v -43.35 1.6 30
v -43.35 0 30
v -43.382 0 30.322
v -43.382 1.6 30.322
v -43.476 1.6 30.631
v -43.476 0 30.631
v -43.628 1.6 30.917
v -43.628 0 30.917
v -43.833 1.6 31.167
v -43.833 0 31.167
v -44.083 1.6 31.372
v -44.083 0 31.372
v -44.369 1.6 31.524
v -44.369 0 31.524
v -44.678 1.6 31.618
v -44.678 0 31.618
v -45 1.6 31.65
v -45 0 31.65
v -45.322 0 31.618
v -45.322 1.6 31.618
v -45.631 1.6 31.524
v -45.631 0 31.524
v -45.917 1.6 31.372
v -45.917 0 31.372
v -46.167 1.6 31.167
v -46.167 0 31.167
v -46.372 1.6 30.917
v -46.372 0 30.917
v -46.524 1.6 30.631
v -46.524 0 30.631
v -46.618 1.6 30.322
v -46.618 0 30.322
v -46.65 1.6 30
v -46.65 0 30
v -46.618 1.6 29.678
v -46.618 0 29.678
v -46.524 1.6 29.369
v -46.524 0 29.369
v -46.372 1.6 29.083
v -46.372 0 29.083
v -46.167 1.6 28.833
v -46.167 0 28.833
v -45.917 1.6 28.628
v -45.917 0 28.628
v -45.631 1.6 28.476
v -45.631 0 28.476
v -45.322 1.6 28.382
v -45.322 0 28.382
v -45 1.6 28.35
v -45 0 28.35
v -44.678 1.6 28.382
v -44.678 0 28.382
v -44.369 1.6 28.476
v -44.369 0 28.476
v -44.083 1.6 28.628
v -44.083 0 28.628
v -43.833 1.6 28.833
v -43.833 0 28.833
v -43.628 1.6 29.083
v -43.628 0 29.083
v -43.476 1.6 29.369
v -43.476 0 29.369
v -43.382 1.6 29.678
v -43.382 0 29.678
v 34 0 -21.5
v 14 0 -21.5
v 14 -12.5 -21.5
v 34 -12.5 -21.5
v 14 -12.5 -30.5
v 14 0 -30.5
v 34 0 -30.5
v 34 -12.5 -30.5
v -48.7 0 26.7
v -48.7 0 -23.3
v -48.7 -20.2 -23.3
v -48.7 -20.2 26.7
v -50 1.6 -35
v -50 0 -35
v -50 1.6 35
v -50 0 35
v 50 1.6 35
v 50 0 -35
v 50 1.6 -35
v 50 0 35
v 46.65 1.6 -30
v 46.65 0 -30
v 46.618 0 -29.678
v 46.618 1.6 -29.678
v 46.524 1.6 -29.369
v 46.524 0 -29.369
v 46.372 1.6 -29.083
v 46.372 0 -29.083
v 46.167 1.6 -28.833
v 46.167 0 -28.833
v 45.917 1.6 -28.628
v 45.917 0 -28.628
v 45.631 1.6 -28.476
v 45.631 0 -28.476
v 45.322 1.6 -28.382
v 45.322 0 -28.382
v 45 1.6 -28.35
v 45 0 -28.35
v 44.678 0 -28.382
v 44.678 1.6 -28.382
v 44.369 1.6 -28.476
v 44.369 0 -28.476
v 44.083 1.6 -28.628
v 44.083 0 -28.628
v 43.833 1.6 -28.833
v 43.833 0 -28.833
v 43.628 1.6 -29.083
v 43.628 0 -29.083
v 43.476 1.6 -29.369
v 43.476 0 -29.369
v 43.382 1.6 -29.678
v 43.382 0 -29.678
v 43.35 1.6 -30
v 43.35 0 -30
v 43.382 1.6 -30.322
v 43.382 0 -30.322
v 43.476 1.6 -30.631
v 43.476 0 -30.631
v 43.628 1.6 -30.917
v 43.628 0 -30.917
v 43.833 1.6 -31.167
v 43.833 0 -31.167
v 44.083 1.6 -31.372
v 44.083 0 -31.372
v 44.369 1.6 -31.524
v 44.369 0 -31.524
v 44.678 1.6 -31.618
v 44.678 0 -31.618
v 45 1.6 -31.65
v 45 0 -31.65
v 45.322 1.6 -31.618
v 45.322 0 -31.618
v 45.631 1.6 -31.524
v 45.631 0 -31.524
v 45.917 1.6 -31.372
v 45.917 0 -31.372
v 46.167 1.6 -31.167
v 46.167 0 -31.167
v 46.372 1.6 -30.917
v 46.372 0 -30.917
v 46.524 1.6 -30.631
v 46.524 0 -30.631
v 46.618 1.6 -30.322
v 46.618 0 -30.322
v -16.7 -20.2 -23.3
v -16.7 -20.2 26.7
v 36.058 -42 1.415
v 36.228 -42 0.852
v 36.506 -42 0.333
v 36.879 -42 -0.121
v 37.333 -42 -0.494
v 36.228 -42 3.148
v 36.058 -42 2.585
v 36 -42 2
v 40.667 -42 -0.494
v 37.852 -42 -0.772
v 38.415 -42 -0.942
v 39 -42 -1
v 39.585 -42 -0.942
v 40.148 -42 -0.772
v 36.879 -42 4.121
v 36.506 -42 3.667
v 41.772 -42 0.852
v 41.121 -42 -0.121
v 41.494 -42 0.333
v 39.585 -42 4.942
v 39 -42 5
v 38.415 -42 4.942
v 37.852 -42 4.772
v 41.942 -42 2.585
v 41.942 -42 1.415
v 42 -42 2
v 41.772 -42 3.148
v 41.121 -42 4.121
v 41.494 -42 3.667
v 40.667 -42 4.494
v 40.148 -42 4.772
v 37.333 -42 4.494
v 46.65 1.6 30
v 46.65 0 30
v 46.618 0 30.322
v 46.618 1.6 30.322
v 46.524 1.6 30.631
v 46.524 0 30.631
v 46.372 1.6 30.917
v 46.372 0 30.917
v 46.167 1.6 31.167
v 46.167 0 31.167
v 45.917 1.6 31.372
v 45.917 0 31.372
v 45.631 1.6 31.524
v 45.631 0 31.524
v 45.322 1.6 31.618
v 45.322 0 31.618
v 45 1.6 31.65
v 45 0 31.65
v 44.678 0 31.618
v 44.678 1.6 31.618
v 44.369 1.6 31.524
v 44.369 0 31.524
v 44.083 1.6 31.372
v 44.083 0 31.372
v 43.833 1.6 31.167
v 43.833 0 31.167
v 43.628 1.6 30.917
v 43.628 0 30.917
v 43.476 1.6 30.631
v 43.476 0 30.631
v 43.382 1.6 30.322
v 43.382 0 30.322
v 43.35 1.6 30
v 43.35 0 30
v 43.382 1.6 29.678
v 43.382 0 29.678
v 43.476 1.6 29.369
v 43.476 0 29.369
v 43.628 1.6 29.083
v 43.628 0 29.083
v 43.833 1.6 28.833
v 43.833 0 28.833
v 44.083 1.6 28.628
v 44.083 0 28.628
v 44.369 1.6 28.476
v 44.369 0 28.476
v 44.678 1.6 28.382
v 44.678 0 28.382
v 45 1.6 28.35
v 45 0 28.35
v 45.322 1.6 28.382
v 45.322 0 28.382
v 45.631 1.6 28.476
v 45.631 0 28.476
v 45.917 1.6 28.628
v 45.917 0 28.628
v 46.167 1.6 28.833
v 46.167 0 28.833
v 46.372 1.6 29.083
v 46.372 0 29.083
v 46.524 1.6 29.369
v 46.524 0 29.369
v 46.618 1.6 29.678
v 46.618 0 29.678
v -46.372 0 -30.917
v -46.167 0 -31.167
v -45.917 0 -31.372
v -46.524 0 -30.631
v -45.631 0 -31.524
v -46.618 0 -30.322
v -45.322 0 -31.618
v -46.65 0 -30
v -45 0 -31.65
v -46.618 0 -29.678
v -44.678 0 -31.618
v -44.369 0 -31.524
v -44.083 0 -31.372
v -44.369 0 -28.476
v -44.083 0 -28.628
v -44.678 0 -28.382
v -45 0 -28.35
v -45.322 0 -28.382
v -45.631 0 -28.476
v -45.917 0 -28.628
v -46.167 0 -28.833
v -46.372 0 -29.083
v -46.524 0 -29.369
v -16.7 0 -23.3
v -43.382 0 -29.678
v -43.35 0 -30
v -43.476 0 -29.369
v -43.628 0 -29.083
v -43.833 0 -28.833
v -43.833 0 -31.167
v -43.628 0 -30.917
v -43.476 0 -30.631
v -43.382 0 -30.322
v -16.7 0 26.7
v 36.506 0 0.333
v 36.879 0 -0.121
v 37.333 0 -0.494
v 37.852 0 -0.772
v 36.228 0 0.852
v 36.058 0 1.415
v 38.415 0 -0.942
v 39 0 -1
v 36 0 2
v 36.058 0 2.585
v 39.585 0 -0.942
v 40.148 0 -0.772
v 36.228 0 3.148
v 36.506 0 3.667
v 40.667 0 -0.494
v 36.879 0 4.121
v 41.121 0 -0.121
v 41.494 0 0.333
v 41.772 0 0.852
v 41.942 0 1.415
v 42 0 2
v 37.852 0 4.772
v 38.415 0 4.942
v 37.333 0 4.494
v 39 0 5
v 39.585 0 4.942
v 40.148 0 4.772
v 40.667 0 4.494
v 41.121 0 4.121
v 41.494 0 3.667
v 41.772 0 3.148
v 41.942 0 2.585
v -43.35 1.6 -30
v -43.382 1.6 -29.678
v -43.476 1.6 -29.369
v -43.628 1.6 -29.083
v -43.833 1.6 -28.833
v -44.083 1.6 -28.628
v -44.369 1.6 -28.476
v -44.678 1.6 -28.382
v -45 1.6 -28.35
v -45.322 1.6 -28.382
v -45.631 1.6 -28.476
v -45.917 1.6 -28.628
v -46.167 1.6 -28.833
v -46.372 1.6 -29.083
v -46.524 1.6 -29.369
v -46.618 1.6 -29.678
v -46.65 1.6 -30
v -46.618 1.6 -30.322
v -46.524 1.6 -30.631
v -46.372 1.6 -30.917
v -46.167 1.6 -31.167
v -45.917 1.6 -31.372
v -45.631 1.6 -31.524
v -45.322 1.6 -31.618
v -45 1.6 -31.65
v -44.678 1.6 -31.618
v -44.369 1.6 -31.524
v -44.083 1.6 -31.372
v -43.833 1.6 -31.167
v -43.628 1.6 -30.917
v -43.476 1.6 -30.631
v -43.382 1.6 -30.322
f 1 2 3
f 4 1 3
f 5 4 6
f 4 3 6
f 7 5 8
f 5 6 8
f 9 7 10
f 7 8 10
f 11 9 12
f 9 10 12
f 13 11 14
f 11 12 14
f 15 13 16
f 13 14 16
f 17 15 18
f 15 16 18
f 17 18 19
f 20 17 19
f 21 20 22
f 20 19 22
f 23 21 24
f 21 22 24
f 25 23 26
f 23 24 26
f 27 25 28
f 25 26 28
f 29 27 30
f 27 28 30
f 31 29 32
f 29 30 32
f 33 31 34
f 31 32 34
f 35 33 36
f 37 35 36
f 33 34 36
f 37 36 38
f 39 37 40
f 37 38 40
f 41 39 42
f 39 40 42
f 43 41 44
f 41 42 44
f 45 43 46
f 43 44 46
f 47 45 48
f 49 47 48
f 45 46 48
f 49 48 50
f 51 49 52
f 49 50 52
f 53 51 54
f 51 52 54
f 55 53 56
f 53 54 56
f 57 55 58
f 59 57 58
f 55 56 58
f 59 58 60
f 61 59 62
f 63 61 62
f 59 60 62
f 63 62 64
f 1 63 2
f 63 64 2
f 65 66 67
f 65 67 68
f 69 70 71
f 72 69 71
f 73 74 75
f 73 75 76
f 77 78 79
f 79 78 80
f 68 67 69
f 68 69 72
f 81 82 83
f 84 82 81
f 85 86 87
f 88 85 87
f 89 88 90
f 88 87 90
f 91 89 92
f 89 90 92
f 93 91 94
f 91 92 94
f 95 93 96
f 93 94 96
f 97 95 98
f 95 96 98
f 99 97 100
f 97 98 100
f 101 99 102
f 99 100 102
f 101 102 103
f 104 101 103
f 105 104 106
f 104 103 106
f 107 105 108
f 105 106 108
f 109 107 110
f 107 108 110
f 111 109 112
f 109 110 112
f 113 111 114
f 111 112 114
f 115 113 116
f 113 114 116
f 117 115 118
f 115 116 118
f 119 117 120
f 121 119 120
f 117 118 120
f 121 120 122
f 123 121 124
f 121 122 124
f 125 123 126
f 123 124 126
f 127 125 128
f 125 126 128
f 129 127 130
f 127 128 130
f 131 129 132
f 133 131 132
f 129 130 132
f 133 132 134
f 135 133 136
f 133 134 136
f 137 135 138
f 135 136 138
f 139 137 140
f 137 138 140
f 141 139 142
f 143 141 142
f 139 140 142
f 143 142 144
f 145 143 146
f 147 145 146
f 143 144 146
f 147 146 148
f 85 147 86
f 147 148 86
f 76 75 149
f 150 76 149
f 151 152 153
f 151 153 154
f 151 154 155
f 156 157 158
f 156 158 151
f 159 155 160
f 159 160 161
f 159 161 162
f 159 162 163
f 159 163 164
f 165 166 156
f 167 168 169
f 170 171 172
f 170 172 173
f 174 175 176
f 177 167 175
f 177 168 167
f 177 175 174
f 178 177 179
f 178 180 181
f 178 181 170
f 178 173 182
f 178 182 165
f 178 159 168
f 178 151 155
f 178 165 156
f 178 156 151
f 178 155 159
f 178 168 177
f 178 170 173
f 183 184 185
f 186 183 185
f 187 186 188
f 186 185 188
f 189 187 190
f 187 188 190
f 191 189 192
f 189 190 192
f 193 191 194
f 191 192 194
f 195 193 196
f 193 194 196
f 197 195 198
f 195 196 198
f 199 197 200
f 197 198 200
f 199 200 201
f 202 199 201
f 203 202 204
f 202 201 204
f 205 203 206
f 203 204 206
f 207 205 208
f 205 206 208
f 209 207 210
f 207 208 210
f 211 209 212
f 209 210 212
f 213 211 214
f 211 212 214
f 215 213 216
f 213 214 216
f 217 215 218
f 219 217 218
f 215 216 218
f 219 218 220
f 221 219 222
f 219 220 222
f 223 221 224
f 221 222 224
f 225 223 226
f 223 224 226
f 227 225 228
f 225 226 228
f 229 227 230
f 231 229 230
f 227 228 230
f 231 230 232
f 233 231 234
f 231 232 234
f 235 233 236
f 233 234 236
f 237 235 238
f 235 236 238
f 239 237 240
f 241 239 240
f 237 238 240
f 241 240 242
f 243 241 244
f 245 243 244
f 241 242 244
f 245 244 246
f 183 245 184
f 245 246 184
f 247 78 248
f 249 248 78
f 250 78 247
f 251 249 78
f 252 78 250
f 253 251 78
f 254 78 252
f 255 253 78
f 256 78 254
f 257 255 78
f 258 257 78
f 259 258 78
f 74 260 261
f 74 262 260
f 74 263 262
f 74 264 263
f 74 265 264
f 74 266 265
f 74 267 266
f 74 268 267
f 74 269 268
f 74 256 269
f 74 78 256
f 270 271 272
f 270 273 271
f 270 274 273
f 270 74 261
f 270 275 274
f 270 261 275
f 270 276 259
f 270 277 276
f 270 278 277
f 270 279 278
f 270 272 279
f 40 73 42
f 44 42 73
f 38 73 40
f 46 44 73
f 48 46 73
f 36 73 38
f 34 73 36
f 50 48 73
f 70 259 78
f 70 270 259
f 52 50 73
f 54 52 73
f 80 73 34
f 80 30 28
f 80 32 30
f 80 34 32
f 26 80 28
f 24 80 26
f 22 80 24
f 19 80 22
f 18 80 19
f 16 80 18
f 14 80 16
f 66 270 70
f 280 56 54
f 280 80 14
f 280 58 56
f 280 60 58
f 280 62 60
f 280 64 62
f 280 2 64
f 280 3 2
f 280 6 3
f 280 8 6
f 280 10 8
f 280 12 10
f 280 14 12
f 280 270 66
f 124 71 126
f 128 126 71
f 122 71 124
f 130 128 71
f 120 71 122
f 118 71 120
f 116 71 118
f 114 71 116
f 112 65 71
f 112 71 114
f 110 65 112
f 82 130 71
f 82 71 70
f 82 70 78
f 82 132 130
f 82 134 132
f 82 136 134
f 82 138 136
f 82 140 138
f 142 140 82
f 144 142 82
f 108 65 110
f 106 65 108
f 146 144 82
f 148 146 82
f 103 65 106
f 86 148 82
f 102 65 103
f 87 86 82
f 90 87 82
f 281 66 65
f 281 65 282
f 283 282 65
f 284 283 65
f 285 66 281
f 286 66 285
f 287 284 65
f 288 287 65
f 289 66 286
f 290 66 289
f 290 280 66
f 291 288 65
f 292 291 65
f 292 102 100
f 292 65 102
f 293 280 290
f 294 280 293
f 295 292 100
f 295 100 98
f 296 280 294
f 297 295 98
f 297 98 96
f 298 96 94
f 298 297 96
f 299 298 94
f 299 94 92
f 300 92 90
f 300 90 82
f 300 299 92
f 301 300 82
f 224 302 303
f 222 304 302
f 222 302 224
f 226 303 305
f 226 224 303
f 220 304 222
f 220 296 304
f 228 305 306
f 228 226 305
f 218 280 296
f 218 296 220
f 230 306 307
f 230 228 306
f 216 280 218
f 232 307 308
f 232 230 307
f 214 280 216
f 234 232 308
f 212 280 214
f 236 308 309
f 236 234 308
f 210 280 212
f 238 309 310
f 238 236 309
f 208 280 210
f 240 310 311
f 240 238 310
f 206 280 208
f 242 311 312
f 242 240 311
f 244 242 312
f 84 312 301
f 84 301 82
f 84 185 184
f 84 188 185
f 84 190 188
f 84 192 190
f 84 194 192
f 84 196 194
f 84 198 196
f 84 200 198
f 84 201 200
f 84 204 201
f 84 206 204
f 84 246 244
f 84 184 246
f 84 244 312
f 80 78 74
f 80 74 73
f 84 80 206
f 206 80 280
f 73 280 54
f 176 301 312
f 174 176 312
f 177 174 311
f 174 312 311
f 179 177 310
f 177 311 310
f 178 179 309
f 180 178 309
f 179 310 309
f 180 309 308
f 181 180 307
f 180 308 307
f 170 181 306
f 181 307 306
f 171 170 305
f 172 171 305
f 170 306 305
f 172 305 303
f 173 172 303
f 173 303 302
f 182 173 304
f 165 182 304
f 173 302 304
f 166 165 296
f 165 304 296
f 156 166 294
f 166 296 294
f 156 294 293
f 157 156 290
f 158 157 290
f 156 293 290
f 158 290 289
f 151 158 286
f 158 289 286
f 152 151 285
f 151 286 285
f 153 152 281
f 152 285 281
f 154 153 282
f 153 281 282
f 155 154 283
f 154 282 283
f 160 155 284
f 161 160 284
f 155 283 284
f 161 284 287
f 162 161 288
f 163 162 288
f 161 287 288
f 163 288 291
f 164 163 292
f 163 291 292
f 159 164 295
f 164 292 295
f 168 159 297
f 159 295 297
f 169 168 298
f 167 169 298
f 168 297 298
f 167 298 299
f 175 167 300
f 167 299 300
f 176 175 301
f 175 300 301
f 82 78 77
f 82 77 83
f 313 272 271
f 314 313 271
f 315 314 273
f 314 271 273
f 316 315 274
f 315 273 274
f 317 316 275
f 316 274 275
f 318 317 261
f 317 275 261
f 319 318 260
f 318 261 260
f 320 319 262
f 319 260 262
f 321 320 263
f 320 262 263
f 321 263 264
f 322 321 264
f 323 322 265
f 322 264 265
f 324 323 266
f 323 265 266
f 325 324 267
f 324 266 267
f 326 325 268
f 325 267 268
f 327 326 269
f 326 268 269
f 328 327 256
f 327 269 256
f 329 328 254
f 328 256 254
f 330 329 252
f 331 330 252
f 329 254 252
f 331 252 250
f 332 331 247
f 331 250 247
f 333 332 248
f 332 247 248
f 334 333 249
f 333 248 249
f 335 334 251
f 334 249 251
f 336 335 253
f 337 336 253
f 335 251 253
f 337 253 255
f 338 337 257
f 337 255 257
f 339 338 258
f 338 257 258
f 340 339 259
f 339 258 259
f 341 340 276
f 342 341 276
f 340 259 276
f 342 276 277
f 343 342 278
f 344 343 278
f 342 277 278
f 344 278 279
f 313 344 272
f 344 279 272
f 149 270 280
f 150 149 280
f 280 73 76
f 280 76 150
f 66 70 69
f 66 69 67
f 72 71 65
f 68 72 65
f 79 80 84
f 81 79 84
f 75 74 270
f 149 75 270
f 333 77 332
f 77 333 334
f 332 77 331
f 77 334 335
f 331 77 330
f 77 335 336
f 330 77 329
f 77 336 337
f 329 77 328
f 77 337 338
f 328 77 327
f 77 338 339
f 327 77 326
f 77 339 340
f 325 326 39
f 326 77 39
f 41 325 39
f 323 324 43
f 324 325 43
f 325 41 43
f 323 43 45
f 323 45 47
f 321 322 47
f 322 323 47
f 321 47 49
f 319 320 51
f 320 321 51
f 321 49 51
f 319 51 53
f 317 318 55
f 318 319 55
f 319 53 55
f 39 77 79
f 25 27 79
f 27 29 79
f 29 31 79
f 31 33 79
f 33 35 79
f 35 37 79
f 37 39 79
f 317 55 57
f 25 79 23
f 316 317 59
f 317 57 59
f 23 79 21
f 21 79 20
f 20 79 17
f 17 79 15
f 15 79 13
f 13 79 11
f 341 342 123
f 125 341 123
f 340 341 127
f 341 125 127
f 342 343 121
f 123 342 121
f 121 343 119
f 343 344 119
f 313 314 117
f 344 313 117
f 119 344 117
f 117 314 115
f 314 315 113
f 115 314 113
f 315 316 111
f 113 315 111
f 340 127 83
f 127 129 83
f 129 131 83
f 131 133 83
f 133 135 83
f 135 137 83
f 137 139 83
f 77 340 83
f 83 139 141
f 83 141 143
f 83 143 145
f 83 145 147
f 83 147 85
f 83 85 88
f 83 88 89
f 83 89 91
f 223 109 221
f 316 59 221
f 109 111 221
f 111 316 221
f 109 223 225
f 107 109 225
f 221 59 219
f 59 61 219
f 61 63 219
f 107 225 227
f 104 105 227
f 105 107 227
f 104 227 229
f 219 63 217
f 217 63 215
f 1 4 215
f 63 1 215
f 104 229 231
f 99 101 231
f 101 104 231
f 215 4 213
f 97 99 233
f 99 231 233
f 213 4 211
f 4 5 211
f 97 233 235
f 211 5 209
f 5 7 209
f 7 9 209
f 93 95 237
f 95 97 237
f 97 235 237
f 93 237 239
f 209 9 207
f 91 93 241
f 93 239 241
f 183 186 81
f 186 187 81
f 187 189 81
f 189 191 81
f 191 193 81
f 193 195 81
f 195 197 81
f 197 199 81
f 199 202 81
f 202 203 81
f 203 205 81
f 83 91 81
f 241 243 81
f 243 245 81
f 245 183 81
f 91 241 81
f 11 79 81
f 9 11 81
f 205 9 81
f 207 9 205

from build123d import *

# Parameters (mm, degrees)
F0_W     = 100
F0_H     = 70
F0_R     = 1.65
F0_W_2   = 20
F0_H_2   = 9
F0_W_3   = 32
F0_H_3   = 50
F0_R_2   = 3
F1_DEPTH = 1.6
F2_DEPTH = 20.2
F3_DEPTH = 12.5
F4_DEPTH = 42


with BuildPart() as f1:
    # F0 (on Front) → F1 (new body)
    with BuildSketch(Plane.XZ):
        Rectangle(F0_W, F0_H)
        with Locations((-45, -30)):
            Circle(F0_R, mode=Mode.SUBTRACT)
        with Locations((24, -26)):
            Rectangle(F0_W_2, F0_H_2, mode=Mode.SUBTRACT)
        with Locations((45, -30)):
            Circle(F0_R, mode=Mode.SUBTRACT)
        with Locations((-32.7, 1.7)):
            Rectangle(F0_W_3, F0_H_3, mode=Mode.SUBTRACT)
        with Locations((-45, 30)):
            Circle(F0_R, mode=Mode.SUBTRACT)
        with Locations((39, 2)):
            Circle(F0_R_2, mode=Mode.SUBTRACT)
        with Locations((45, 30)):
            Circle(F0_R, mode=Mode.SUBTRACT)
        with Locations((-32.7, 1.7)):
            Rectangle(F0_W_3, F0_H_3)
        with Locations((24, -26)):
            Rectangle(F0_W_2, F0_H_2)
        with Locations((39, 2)):
            Circle(F0_R_2)
    extrude(amount=-F1_DEPTH)

    # F0 (on Front) → F2 (join)
    with BuildSketch(Plane.XZ):
        with Locations((-32.7, 1.7)):
            Rectangle(F0_W_3, F0_H_3)
    extrude(amount=F2_DEPTH)

    # F0 (on Front) → F3 (join)
    with BuildSketch(Plane.XZ):
        with Locations((24, -26)):
            Rectangle(F0_W_2, F0_H_2)
    extrude(amount=F3_DEPTH)

    # F0 (on Front) → F4 (join)
    with BuildSketch(Plane.XZ):
        with Locations((39, 2)):
            Circle(F0_R_2)
    extrude(amount=F4_DEPTH)


solid = f1.part
